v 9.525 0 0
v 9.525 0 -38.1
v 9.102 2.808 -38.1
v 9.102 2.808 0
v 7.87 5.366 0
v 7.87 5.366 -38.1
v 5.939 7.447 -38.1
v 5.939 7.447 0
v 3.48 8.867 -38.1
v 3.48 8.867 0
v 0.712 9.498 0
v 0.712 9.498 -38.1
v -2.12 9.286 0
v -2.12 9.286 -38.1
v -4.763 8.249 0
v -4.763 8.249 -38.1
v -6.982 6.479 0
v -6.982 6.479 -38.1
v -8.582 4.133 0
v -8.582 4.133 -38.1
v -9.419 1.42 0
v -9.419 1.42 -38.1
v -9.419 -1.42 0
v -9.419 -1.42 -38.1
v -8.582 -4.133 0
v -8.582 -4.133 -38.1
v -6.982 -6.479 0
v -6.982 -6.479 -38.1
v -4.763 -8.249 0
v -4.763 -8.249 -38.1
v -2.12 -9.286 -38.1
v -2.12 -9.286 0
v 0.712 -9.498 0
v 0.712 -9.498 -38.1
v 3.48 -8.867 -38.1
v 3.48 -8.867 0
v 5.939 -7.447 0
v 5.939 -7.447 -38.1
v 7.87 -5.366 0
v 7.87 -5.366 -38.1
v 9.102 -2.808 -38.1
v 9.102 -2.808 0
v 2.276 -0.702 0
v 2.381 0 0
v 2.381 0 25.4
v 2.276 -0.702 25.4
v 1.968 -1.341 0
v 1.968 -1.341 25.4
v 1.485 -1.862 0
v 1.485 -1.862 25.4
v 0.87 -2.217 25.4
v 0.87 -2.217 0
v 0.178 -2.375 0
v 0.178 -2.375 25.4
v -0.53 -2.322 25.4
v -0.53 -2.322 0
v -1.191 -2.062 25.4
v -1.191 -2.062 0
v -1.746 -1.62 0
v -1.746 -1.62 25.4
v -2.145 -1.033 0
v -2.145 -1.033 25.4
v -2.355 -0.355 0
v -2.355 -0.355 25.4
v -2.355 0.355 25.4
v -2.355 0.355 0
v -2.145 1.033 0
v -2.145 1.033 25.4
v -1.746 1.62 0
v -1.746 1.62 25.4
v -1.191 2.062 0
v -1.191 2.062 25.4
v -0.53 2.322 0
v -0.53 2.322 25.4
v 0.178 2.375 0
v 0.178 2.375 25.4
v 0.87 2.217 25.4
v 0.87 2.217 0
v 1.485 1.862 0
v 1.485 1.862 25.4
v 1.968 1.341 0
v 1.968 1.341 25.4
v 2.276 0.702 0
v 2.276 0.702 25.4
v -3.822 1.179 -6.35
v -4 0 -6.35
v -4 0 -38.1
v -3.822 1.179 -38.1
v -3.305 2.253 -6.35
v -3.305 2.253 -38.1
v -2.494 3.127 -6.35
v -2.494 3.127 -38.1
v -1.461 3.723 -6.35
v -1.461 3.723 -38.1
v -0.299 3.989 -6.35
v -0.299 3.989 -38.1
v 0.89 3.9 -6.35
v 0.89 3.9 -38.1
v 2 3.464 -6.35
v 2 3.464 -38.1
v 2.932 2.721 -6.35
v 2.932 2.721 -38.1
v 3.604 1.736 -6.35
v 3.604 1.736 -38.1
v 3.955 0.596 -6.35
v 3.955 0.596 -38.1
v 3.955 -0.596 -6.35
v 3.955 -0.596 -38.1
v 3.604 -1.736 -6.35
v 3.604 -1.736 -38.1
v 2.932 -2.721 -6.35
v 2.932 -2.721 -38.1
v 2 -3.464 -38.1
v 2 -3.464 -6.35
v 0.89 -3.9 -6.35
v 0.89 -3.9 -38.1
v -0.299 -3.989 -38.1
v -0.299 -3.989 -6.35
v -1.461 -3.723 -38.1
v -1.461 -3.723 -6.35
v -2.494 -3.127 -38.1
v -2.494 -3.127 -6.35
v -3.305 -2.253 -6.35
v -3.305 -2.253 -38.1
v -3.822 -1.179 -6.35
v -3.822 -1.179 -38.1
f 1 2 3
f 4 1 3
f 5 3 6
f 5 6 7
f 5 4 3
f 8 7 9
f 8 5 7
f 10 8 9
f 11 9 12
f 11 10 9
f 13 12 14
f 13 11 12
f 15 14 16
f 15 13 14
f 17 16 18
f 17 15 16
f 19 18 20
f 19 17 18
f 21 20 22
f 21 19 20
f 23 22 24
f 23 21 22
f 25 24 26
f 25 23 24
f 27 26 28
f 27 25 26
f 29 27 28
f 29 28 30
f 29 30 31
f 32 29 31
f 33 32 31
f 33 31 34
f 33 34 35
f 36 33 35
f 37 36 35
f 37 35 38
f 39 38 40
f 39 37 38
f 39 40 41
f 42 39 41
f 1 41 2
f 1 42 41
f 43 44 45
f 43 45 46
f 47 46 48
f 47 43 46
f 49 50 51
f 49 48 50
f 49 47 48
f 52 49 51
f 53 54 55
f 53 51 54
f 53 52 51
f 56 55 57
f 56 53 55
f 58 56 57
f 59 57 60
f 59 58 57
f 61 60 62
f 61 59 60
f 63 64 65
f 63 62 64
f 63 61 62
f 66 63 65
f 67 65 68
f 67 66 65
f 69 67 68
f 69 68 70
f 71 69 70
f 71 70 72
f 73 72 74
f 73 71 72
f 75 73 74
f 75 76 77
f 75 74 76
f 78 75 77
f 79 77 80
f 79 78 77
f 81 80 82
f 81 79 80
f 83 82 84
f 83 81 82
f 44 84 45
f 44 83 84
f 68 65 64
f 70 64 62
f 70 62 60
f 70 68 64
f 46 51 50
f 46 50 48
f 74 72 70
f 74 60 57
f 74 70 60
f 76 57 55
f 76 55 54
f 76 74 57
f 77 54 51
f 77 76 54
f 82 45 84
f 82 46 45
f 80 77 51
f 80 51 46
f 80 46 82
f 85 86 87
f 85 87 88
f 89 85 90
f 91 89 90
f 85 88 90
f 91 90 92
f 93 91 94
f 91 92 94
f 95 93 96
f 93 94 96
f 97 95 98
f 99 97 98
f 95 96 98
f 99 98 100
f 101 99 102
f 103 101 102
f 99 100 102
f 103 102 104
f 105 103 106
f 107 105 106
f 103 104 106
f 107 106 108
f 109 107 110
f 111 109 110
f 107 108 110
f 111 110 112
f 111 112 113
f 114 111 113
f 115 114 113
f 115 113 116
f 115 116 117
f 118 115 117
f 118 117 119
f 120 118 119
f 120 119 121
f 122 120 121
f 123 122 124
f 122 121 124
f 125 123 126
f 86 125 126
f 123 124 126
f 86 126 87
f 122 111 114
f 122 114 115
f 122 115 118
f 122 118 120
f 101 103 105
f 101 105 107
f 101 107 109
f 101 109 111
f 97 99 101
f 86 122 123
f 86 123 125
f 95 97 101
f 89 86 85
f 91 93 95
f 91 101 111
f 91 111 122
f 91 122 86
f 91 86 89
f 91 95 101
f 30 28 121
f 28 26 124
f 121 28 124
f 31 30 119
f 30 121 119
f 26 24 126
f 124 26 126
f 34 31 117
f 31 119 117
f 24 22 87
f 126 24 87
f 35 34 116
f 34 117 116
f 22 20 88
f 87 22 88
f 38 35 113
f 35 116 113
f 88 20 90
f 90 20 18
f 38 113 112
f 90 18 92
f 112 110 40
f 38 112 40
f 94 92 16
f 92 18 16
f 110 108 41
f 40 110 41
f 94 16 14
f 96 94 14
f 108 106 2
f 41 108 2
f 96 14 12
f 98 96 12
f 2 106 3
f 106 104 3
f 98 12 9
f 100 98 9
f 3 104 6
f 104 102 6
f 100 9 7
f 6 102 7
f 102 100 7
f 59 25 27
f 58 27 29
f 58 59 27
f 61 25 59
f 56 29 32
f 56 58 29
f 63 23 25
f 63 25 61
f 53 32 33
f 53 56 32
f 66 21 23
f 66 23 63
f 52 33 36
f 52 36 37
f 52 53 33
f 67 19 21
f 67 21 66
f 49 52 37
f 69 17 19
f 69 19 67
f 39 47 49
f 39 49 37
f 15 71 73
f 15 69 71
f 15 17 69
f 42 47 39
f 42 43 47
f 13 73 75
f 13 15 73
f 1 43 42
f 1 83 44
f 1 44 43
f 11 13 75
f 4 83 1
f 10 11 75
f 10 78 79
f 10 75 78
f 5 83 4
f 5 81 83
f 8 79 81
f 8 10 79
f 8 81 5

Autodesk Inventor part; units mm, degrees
ref_plane "YZ Plane" through (0, 0, 0) normal (1, 0, 0) x (0, 1, 0)
ref_plane "XZ Plane" through (0, 0, 0) normal (0, 1, 0) x (-1, 0, 0)
ref_plane "XY Plane" through (0, 0, 0) normal (0, 0, 1) x (1, 0, 0)
sketch "Sketch1" plane through (0, 0, 0) normal (0, 0, 1) x (1, 0, 0)
  circle A0 centre (0, 0) radius 9.525
  dimension "d8" = 19.05
extrude "Extrusion1" add sketch "Sketch1" against normal blind 38.1
sketch "Sketch2" plane through (0, 0, 0) normal (0, 0, 1) x (1, 0, 0)
  circle A0 centre (0, 0) radius 2.3813
  dimension "d2" = 4.7625
extrude "Extrusion2" add sketch "Sketch2" along normal blind 25.4
sketch "Sketch4" plane through (0, 0, -38.1) normal (0, 0, -1) x (-1, 0, 0)
  circle A0 centre (0, 0) radius 4
  dimension "d5" = 8
extrude "Extrusion3" cut sketch "Sketch4" against normal blind 31.75
properties part number "CIM to 0_1875 Worm Gearn"
